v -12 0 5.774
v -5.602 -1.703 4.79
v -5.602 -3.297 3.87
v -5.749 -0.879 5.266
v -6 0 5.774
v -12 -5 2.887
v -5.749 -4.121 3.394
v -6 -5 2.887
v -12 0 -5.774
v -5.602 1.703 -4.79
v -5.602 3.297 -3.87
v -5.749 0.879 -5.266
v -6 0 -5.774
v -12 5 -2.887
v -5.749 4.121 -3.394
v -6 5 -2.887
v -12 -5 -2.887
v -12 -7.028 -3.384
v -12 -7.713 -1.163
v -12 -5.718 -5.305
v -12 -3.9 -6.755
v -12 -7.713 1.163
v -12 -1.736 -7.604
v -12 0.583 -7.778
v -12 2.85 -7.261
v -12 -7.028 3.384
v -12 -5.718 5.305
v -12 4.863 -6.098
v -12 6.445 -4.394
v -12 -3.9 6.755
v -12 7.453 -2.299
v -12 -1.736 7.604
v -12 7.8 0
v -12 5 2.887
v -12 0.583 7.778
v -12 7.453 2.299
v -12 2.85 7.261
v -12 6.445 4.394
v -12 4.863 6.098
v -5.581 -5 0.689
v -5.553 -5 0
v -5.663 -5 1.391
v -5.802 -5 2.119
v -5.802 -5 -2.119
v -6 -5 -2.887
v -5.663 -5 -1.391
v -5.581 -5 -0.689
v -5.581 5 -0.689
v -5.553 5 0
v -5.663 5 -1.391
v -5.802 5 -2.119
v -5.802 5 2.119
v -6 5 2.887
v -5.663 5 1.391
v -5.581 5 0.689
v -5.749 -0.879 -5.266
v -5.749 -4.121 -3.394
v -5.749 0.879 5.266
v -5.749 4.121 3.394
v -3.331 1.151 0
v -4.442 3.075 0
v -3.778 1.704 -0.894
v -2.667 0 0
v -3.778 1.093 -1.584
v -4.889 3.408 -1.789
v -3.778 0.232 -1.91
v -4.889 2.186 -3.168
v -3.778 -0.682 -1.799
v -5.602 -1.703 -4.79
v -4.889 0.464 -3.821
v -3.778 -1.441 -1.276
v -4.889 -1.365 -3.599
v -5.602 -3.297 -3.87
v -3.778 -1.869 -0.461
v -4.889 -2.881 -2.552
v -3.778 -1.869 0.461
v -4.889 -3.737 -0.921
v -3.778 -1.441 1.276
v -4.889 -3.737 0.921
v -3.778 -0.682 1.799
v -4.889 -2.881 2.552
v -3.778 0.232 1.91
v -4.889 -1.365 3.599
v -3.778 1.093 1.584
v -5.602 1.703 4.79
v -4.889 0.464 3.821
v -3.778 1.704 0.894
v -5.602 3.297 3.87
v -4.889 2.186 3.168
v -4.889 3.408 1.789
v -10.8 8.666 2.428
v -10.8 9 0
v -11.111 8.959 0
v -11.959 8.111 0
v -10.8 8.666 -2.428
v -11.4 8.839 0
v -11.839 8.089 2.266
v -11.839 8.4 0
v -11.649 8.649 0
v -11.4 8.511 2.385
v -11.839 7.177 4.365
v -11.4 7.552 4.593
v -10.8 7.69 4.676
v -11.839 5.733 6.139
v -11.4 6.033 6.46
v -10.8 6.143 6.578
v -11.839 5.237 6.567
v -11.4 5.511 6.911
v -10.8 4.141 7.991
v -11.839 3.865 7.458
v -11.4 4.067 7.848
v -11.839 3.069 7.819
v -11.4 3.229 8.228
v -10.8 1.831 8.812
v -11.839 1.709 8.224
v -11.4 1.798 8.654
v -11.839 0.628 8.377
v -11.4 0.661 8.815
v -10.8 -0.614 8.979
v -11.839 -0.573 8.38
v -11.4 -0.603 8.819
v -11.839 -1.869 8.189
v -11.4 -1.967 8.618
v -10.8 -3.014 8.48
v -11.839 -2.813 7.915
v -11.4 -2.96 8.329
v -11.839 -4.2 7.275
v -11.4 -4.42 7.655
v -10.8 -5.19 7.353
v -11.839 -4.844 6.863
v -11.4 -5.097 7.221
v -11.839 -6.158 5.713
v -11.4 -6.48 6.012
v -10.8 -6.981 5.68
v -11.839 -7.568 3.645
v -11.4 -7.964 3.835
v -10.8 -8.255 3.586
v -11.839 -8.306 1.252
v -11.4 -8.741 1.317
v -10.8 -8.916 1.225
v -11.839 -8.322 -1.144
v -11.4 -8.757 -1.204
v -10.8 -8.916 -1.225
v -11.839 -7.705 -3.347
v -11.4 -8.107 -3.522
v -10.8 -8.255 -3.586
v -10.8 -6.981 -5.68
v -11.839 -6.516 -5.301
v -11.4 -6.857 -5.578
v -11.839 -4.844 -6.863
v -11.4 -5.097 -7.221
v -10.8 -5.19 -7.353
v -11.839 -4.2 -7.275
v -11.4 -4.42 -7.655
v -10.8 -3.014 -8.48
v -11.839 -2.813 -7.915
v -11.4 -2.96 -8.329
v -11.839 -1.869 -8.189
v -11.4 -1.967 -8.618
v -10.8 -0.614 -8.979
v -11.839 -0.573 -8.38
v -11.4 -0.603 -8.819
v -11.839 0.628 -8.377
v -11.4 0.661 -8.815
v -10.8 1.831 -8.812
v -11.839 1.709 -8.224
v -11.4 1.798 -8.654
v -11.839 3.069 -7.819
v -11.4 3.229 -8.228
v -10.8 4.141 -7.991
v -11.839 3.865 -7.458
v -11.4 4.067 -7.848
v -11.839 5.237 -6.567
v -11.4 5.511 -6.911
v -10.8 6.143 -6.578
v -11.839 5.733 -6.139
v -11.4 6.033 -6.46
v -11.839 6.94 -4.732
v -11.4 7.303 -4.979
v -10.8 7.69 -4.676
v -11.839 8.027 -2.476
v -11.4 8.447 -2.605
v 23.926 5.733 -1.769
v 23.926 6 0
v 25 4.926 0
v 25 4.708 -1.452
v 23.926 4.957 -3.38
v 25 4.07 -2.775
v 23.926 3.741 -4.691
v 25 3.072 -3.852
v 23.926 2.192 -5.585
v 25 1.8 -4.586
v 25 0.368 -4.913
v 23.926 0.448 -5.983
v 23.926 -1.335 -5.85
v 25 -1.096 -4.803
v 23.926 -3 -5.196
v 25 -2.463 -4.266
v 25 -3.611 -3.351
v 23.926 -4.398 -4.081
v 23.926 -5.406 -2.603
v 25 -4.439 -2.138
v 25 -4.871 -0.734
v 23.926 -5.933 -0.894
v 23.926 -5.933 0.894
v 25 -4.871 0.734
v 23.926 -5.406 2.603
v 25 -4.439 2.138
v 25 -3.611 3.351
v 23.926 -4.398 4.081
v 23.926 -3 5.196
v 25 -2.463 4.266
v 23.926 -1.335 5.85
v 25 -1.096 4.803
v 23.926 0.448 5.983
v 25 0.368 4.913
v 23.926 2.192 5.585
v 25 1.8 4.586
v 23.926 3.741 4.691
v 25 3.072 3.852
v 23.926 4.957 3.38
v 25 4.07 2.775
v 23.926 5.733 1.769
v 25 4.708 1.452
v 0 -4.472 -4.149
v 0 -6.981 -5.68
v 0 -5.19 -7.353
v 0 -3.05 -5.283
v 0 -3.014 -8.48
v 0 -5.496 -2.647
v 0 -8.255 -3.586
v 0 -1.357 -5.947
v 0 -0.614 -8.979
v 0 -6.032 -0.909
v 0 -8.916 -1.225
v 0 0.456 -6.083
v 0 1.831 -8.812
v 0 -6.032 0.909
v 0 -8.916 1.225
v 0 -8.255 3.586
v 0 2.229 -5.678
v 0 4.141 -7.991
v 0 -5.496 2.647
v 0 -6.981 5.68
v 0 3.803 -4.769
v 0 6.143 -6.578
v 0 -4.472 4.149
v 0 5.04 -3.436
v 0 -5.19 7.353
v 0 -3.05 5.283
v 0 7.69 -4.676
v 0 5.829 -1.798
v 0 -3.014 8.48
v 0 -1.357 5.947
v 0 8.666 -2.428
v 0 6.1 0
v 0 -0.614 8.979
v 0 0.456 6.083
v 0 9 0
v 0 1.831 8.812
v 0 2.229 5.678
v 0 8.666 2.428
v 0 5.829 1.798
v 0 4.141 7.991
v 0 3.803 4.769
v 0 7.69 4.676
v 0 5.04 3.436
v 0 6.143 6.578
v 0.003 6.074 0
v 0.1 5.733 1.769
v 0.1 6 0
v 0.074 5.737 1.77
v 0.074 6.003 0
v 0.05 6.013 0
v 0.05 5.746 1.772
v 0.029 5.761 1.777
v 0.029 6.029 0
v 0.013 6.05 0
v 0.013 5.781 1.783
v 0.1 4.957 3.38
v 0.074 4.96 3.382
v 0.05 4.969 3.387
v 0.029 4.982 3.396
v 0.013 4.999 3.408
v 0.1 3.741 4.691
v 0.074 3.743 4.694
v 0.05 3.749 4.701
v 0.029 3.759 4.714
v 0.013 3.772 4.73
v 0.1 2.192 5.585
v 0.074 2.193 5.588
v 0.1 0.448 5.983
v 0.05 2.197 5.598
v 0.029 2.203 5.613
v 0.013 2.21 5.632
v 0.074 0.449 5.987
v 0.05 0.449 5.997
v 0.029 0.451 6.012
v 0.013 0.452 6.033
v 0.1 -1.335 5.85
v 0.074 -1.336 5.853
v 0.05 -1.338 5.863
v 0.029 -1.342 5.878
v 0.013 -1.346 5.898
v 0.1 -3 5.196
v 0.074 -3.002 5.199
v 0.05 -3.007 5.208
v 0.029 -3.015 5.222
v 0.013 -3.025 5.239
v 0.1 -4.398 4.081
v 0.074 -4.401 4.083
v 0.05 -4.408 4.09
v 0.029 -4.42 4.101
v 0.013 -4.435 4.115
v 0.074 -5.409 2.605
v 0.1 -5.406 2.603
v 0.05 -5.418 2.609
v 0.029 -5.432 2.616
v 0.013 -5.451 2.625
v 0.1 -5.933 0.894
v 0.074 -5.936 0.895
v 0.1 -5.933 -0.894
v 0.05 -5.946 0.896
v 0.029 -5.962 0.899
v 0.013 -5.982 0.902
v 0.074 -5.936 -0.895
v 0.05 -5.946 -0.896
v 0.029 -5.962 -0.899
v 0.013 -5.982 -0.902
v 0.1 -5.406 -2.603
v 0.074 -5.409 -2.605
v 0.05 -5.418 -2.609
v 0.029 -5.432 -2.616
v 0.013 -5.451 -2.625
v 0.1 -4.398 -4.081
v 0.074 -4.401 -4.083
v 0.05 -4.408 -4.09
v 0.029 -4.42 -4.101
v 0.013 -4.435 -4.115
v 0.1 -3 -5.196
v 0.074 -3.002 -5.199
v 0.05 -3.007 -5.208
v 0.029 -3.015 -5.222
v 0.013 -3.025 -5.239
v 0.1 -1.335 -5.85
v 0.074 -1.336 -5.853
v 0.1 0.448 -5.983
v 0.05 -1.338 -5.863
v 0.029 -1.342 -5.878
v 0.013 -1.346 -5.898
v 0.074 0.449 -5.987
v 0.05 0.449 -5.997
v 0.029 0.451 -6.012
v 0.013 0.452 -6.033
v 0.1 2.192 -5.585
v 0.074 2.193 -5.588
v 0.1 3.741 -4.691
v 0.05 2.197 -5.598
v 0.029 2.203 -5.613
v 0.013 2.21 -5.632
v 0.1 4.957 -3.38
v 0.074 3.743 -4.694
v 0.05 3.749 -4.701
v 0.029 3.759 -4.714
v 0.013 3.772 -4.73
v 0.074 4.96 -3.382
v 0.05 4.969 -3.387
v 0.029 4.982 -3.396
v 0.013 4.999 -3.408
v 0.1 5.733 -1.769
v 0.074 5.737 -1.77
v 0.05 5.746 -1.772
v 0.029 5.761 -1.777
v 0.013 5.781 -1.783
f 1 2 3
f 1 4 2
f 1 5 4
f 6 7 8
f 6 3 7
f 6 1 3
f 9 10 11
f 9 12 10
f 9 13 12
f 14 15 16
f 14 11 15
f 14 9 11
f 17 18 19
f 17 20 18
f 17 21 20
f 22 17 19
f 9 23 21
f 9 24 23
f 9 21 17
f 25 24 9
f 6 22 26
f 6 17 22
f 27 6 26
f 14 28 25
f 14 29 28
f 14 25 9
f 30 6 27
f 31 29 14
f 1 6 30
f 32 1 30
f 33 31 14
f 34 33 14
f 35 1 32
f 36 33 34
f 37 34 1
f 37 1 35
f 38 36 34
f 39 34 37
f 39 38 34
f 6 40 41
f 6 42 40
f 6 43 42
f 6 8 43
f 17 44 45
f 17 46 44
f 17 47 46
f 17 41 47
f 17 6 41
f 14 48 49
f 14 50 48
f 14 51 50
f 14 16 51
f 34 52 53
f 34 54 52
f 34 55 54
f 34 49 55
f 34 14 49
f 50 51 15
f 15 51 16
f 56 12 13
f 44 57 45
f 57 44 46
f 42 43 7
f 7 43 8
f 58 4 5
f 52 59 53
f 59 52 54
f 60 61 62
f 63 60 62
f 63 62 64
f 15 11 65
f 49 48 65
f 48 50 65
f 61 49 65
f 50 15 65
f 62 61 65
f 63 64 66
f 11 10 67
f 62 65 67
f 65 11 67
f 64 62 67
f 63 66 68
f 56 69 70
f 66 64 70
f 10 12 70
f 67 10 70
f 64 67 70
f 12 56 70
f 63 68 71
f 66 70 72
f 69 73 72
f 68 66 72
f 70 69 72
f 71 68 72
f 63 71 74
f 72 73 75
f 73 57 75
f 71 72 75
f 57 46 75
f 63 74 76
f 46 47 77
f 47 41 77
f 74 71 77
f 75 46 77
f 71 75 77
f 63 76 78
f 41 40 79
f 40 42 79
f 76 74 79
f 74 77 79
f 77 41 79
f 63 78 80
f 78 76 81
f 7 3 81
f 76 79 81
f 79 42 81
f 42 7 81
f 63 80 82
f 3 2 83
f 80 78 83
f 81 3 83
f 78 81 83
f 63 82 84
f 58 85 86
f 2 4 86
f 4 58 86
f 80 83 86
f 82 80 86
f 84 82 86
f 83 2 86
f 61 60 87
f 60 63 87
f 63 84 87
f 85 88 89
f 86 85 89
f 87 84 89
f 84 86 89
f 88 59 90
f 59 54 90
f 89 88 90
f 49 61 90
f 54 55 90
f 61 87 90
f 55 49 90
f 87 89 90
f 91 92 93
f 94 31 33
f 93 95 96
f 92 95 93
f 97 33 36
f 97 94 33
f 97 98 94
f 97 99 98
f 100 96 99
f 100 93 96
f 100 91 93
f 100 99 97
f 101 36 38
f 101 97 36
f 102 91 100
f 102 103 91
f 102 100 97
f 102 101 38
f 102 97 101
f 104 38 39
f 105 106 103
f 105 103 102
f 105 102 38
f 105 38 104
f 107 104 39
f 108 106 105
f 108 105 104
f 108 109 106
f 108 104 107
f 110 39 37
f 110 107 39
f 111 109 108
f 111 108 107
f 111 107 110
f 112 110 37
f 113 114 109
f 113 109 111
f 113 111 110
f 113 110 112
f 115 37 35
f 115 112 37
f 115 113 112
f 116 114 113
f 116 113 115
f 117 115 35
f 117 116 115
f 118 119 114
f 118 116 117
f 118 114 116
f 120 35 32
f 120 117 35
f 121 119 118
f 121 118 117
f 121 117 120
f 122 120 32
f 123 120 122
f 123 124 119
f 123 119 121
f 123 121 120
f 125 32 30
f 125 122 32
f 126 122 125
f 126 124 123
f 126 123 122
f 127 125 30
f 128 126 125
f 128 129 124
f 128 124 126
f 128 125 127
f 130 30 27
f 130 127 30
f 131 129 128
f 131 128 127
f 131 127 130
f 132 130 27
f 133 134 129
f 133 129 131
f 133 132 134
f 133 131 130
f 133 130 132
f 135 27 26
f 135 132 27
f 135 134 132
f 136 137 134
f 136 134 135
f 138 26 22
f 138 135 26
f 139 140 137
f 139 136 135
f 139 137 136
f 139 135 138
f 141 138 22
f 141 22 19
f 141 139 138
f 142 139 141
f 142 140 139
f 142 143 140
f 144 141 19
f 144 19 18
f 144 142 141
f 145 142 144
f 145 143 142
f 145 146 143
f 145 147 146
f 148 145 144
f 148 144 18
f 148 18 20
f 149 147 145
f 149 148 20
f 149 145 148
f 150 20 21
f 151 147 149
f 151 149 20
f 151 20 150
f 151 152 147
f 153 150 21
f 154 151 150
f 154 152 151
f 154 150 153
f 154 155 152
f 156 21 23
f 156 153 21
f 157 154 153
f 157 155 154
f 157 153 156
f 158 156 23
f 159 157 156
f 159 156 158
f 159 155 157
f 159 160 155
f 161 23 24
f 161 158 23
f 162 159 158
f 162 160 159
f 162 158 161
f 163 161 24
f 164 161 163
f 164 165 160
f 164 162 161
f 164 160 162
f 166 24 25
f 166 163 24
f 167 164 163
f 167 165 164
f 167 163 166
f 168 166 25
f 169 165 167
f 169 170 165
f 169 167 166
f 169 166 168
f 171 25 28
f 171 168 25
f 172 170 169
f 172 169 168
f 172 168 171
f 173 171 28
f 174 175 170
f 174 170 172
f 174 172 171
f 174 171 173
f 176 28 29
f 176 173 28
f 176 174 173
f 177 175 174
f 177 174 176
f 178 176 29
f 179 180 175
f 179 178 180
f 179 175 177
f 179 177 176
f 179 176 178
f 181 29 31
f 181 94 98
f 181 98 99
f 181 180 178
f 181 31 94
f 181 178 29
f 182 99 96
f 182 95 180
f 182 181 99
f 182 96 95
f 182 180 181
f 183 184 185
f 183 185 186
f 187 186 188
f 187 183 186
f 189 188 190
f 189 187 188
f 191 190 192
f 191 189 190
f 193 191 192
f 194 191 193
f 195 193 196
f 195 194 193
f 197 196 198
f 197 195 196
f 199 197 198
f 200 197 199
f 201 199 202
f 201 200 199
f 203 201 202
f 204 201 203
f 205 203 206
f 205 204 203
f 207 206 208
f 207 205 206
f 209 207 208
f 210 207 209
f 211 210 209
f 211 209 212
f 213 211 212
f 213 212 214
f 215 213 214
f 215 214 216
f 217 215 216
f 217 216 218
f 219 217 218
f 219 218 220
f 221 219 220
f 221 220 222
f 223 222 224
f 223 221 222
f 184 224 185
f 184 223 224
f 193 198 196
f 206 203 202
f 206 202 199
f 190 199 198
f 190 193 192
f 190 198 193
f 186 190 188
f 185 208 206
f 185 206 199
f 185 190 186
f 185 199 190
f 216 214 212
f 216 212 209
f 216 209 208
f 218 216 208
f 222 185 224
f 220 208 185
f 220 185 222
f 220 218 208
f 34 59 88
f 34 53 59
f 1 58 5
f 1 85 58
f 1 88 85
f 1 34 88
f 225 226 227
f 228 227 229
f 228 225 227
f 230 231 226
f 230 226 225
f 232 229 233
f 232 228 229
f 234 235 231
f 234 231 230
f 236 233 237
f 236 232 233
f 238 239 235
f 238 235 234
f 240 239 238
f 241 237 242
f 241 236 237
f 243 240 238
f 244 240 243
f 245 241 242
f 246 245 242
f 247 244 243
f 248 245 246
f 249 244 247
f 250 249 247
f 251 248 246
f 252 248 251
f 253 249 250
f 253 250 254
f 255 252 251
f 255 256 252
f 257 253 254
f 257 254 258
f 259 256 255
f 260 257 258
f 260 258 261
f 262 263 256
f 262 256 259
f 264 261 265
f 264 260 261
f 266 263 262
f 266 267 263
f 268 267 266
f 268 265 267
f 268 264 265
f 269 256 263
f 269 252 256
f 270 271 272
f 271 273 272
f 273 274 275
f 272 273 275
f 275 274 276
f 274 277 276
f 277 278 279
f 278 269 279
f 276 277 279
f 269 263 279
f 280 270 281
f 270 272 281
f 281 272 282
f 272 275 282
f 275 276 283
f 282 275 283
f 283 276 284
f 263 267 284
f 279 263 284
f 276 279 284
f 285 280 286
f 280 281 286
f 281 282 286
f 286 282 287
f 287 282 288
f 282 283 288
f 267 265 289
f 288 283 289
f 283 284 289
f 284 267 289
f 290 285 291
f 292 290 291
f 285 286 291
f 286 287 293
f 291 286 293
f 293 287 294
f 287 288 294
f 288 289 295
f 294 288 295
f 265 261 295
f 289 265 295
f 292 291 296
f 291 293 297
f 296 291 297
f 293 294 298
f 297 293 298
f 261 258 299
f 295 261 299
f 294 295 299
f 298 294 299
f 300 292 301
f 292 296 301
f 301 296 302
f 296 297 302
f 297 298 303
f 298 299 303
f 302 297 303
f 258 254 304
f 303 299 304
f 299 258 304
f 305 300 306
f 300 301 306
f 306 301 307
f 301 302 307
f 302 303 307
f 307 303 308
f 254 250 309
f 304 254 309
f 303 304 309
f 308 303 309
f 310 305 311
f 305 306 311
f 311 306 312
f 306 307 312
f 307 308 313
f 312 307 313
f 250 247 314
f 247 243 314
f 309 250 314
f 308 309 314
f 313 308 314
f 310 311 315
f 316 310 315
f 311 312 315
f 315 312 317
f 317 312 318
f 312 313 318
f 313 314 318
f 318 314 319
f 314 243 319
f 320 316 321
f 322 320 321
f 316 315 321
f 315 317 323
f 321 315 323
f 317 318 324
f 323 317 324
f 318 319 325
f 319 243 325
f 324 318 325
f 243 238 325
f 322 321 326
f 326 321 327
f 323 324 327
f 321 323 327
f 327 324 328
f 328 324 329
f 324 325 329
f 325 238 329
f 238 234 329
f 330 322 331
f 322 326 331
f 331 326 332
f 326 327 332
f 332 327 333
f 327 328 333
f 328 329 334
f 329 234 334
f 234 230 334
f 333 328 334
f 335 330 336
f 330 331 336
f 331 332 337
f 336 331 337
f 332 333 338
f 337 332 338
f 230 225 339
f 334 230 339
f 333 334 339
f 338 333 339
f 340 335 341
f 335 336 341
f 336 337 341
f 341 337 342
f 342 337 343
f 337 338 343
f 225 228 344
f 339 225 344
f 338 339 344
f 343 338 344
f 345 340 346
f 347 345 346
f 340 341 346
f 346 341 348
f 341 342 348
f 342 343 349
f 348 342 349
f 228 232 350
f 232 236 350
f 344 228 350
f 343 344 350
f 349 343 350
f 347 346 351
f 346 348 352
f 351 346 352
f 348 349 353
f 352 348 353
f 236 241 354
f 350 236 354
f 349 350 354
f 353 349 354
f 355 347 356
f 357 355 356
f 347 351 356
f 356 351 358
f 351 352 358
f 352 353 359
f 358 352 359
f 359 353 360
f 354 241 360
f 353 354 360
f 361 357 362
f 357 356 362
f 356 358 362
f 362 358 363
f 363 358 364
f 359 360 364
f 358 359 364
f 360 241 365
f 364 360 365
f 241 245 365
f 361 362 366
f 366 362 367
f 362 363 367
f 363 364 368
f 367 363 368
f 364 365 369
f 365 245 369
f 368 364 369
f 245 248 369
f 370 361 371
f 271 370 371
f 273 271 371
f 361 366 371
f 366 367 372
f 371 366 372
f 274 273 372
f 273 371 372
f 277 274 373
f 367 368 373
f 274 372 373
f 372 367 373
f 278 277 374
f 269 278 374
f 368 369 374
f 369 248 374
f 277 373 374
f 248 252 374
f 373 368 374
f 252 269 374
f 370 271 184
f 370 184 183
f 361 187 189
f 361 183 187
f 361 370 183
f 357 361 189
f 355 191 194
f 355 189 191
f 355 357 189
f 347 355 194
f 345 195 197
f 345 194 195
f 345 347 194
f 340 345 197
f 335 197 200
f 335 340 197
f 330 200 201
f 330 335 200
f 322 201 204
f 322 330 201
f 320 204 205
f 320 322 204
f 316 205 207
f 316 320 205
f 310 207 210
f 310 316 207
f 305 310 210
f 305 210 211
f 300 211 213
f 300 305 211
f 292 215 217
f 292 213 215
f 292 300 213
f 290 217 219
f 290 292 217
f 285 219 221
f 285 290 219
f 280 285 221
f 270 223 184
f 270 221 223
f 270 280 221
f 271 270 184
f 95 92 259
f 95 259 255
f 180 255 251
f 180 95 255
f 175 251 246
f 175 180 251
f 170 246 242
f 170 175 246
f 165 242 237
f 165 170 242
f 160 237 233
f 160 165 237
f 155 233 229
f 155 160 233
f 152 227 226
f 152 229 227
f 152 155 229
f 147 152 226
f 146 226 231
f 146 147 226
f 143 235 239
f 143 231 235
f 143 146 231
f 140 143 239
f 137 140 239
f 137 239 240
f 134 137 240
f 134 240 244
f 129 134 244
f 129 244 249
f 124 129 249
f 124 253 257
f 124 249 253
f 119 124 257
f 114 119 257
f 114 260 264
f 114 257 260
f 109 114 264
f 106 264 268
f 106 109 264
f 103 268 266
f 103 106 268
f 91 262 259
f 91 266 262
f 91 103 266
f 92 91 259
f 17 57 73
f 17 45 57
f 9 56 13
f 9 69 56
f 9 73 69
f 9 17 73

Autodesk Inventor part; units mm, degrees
ref_plane "YZ Plane" through (0, 0, 0) normal (1, 0, 0) x (0, 1, 0)
ref_plane "XZ Plane" through (0, 0, 0) normal (0, 1, 0) x (-1, 0, 0)
sketch "Sketch1" plane through (0, 0, 0) normal (0, 0, 1) x (1, 0, 0)
  line L0 (-2.6667, 0) -> (25, 0)
  line L1 (25, 0) -> (25, 6)
  line L2 (25, 6) -> (4.375, 6)
  line L3 (4.375, 6) -> (3.3014, 6)
  line L4 (3.3014, 6) -> (0, 6)
  line L5 (0, 6) -> (0, 9)
  line L6 (0, 9) -> (-12, 9)
  line L7 (-12, 9) -> (-12, 5.7735)
  line L8 (-12, 5.7735) -> (-6, 5.7735)
  line L9 (-6, 5.7735) -> (-2.6667, 0)
  line L10 (-19.4, 0) -> (32.4, 0) projected
  line L11 (0, -1.8) -> (0, 10.8) projected
  line L12 (4.375, 6) -> (0, 6) construction
  dimension "d1" = 20.625
  dimension "d2" = 1.0736
  dimension "d3" = 12
  dimension "d4" = 6
  dimension "d5" = 60
  dimension "d6" = 12
  dimension "d7" = 12
  dimension "d8" = 11.547
  dimension "d9" = 18
  dimension "d26" = 25
revolve "Body" add sketch "Sketch1" angle 360 about axis through (-2.6667, 0, 0) along (1, 0, 0)
sketch "Sketch2" plane through (-12, 0, 0) normal (-1, 0, 0) x (0, 0, 1)
  circle A0 centre (0, 0) radius 5.7735 projected
  line L0 (0, -12.6) -> (0, 12.6) projected
  line L1 (-12.6, 0) -> (12.6, 0) projected
  line L2 (5.7735, 0) -> (2.8868, -5)
  line L3 (2.8868, -5) -> (-2.8868, -5)
  line L4 (-2.8868, -5) -> (-5.7735, 0)
  line L5 (-5.7735, 0) -> (-2.8868, 5)
  line L6 (-2.8868, 5) -> (2.8868, 5)
  line L7 (2.8868, 5) -> (5.7735, 0)
extrude "Slot" add sketch "Sketch2" against normal up to next contours L7 A0 | A0 L2 | L6 L0 A0 | A0 L0 L3 | L0 L6 A0 | A0 L3 L0 | L4 A0 | A0 L5
fillet "Fillet1" radius 1.2 1 edges at (-12, -9, 0)
thread "Thread" size "M12x1.75" class "6g" standard "ISO Metric profile" length 20.625
chamfer "Chamfer1" distance 1.0735 distance2 1.0735 1 edges at (25, -6, 0) measured on face at (25, -3.0269, -1.5886)
ref_plane "Work Plane1" through (29, 0, 0) normal (0, -1, 0) x (1, 0, 0)
fillet "Fillet2" radius 0.1 1 edges at (0, -6, 0)
equation "\"d1\" = GEL"
equation "\"d3\" = KOH"
equation "\"d4\" = INTI"
equation "\"d6\" = GD"
equation "\"d7\" = BDM"
equation "\"d8\" = 1.1547 * SW"
equation "\"d9\" = KOD"
equation "\"d26\" = NLG"
equation "\"d30\" = R"
equation "\"d17\" = RR"
equation "\"d13\" = GEL"
equation "\"d15\" = -0.5 * SPD + 0.5 * GD"
equation "\"d16\" = GUL"
equation "\"GD\" = NND"
equation "\"NLG\" = 25"
equation "\"GEL\" = 20.625"
equation "\"KOD\" = 18"
equation "\"KOH\" = NND"
equation "\"INTI\" = 6"
equation "\"GAL\" = 0.61345 * PTC"
equation "\"GUL\" = 0.61345 * PTC"
equation "\"BDM\" = NND"
equation "\"RR\" = 0.1 * NND"
equation "\"SPD\" = NND - 1.2269 * PTC"
equation "\"R\" = 0.1"
equation "\"PHH\" = 0.25"
equation "\"GD1\" = THREADDIA - 1.2269 * PTC"
equation "\"THREADDIA\" = 12"
equation "\"FAWI\" = 45deg"
equation "\"PTC\" = 1.75"
equation "\"KOH1\" = 10.8"
equation "\"NND\" = 12"
equation "\"TOA\" = 30deg"
equation "\"E0\" = 1.155 * SW"
equation "\"SW\" = 10"
properties part number "AS 1420 - 1973 - M12 x 25" material "Steel, Mild"
